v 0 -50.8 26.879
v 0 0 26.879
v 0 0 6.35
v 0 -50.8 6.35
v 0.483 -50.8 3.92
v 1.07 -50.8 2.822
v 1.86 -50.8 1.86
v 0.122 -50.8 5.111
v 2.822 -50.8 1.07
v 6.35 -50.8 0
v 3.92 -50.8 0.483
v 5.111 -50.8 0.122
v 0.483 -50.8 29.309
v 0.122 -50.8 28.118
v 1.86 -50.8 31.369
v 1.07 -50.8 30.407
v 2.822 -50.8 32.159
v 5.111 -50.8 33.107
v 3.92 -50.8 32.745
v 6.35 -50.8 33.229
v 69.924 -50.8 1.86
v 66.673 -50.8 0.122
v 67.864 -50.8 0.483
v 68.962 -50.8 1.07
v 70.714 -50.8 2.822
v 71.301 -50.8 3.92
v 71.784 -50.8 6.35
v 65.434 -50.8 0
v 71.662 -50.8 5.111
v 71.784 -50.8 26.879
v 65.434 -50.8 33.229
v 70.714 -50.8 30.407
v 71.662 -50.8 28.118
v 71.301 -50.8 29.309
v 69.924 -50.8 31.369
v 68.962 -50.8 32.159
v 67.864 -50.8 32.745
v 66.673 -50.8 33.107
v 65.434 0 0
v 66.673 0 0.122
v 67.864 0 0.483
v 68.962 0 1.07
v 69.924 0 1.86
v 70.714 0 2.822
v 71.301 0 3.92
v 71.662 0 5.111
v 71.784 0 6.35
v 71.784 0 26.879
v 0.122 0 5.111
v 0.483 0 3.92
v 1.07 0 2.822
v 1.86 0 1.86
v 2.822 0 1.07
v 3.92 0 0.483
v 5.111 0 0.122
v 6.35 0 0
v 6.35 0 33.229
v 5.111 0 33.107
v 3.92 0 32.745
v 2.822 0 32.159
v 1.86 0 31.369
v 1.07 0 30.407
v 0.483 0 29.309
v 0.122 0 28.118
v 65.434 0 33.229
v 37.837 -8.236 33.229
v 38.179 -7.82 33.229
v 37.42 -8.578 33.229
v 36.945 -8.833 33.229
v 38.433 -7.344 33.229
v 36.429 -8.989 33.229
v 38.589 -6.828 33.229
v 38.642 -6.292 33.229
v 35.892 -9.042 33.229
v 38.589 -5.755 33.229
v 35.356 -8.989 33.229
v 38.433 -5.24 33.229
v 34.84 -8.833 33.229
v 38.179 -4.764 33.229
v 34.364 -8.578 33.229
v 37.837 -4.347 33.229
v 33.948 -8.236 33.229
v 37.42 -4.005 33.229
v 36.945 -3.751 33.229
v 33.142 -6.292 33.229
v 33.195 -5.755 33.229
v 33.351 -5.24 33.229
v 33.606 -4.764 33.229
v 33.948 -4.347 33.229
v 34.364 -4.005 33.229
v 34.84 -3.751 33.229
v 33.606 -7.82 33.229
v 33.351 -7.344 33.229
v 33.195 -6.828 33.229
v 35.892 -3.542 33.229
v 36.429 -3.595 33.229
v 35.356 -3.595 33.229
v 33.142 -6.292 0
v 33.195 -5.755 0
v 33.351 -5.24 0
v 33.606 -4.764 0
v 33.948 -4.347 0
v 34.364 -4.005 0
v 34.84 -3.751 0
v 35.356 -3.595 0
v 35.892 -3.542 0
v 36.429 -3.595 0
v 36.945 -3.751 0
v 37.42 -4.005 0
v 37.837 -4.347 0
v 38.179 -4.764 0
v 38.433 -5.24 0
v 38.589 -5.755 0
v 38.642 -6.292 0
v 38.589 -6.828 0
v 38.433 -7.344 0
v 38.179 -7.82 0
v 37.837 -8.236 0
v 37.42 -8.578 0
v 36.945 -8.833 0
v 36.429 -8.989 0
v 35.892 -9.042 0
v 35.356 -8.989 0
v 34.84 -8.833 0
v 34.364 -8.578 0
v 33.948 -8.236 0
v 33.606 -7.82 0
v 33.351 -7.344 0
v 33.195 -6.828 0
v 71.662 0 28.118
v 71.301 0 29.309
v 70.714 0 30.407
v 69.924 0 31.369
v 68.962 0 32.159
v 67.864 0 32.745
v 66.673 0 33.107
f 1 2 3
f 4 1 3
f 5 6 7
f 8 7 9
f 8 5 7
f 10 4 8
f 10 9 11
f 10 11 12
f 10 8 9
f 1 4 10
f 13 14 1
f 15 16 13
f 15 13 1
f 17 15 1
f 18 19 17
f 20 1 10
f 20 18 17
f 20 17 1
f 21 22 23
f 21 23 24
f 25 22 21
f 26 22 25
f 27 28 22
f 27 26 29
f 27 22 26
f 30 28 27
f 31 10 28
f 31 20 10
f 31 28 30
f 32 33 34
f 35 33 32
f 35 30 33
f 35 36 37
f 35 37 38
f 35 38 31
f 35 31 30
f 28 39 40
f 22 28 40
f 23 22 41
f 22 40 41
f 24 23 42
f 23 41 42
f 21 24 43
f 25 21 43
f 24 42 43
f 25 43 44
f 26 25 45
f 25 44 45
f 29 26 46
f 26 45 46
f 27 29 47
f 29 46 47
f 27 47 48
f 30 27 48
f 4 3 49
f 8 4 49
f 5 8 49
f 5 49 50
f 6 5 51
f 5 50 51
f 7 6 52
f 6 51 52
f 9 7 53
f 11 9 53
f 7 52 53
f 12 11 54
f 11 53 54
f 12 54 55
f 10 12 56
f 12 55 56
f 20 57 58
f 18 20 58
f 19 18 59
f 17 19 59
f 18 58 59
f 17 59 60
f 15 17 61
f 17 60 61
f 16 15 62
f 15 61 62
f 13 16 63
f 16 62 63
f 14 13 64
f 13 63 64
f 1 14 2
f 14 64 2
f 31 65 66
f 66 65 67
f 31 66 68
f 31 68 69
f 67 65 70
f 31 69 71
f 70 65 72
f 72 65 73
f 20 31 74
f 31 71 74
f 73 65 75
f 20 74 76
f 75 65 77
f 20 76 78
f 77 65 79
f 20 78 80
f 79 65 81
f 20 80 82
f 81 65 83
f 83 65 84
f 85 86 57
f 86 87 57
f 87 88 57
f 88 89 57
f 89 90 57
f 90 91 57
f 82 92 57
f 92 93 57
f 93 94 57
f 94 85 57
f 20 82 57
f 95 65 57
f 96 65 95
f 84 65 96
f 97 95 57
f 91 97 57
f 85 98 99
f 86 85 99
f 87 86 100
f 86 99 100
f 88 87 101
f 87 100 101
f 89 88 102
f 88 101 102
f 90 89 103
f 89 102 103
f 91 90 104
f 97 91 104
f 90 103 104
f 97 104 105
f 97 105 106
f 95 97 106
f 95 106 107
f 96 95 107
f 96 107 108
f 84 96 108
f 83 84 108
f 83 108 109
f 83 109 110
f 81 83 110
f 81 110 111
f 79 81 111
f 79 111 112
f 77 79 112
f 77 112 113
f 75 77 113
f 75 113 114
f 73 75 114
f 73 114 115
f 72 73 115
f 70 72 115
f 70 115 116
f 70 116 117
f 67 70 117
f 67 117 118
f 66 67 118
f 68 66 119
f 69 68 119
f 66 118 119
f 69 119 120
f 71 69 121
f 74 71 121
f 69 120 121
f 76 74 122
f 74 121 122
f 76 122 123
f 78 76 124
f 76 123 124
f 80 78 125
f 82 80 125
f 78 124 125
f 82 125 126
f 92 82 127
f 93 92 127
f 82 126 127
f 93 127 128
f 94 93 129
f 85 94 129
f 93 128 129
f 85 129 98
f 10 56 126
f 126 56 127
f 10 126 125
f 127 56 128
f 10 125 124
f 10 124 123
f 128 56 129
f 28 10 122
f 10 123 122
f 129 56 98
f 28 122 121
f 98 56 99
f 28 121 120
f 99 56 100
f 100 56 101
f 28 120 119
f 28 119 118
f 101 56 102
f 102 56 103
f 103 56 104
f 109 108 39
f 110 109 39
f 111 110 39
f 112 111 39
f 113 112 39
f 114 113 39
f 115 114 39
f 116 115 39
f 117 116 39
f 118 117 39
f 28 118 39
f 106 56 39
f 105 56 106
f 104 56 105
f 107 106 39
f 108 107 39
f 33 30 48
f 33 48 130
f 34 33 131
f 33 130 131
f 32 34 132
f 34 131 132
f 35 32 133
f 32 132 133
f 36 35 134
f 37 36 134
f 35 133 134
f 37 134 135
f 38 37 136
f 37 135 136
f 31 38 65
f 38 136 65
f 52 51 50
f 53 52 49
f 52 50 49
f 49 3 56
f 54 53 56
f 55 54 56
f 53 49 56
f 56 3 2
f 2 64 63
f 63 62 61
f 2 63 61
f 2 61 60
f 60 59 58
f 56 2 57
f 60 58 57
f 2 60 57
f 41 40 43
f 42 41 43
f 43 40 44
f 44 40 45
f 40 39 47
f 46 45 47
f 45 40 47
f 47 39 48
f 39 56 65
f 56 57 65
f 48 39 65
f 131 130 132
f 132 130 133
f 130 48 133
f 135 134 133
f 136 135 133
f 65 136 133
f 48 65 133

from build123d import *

# Parameters (mm, degrees)
F1_DEPTH = 50.8
F3_D     = 5.5


with BuildPart() as f1:
    # F0 (on Front) → F1 (new body)
    with BuildSketch(Plane.XZ):
        with BuildLine():
            ThreePointArc((0, 6.35), (1.8598719395, 1.8598719395), (6.35, 0))
            Line((6.35, 0), (65.4343323946, 0))
            ThreePointArc((65.4343323946, 0), (69.9244604551, 1.8598719395), (71.7843323946, 6.35))
            Line((71.7843323946, 6.35), (71.7843323946, 26.8787885249))
            ThreePointArc((71.7843323946, 26.8787885249), (69.9244604551, 31.3689165854), (65.4343323946, 33.2287885249))
            Line((65.4343323946, 33.2287885249), (6.35, 33.2287885249))
            ThreePointArc((6.35, 33.2287885249), (1.8598719395, 31.3689165854), (0, 26.8787885249))
            Line((0, 26.8787885249), (0, 6.35))
        make_face()
    extrude(amount=F1_DEPTH)

    # F3 (through all)
    with Locations(Plane.XY.offset(33.2287885249)):
        with Locations((35.8921661973, -6.2919375487)):
            Hole(F3_D / 2)


solid = f1.part
